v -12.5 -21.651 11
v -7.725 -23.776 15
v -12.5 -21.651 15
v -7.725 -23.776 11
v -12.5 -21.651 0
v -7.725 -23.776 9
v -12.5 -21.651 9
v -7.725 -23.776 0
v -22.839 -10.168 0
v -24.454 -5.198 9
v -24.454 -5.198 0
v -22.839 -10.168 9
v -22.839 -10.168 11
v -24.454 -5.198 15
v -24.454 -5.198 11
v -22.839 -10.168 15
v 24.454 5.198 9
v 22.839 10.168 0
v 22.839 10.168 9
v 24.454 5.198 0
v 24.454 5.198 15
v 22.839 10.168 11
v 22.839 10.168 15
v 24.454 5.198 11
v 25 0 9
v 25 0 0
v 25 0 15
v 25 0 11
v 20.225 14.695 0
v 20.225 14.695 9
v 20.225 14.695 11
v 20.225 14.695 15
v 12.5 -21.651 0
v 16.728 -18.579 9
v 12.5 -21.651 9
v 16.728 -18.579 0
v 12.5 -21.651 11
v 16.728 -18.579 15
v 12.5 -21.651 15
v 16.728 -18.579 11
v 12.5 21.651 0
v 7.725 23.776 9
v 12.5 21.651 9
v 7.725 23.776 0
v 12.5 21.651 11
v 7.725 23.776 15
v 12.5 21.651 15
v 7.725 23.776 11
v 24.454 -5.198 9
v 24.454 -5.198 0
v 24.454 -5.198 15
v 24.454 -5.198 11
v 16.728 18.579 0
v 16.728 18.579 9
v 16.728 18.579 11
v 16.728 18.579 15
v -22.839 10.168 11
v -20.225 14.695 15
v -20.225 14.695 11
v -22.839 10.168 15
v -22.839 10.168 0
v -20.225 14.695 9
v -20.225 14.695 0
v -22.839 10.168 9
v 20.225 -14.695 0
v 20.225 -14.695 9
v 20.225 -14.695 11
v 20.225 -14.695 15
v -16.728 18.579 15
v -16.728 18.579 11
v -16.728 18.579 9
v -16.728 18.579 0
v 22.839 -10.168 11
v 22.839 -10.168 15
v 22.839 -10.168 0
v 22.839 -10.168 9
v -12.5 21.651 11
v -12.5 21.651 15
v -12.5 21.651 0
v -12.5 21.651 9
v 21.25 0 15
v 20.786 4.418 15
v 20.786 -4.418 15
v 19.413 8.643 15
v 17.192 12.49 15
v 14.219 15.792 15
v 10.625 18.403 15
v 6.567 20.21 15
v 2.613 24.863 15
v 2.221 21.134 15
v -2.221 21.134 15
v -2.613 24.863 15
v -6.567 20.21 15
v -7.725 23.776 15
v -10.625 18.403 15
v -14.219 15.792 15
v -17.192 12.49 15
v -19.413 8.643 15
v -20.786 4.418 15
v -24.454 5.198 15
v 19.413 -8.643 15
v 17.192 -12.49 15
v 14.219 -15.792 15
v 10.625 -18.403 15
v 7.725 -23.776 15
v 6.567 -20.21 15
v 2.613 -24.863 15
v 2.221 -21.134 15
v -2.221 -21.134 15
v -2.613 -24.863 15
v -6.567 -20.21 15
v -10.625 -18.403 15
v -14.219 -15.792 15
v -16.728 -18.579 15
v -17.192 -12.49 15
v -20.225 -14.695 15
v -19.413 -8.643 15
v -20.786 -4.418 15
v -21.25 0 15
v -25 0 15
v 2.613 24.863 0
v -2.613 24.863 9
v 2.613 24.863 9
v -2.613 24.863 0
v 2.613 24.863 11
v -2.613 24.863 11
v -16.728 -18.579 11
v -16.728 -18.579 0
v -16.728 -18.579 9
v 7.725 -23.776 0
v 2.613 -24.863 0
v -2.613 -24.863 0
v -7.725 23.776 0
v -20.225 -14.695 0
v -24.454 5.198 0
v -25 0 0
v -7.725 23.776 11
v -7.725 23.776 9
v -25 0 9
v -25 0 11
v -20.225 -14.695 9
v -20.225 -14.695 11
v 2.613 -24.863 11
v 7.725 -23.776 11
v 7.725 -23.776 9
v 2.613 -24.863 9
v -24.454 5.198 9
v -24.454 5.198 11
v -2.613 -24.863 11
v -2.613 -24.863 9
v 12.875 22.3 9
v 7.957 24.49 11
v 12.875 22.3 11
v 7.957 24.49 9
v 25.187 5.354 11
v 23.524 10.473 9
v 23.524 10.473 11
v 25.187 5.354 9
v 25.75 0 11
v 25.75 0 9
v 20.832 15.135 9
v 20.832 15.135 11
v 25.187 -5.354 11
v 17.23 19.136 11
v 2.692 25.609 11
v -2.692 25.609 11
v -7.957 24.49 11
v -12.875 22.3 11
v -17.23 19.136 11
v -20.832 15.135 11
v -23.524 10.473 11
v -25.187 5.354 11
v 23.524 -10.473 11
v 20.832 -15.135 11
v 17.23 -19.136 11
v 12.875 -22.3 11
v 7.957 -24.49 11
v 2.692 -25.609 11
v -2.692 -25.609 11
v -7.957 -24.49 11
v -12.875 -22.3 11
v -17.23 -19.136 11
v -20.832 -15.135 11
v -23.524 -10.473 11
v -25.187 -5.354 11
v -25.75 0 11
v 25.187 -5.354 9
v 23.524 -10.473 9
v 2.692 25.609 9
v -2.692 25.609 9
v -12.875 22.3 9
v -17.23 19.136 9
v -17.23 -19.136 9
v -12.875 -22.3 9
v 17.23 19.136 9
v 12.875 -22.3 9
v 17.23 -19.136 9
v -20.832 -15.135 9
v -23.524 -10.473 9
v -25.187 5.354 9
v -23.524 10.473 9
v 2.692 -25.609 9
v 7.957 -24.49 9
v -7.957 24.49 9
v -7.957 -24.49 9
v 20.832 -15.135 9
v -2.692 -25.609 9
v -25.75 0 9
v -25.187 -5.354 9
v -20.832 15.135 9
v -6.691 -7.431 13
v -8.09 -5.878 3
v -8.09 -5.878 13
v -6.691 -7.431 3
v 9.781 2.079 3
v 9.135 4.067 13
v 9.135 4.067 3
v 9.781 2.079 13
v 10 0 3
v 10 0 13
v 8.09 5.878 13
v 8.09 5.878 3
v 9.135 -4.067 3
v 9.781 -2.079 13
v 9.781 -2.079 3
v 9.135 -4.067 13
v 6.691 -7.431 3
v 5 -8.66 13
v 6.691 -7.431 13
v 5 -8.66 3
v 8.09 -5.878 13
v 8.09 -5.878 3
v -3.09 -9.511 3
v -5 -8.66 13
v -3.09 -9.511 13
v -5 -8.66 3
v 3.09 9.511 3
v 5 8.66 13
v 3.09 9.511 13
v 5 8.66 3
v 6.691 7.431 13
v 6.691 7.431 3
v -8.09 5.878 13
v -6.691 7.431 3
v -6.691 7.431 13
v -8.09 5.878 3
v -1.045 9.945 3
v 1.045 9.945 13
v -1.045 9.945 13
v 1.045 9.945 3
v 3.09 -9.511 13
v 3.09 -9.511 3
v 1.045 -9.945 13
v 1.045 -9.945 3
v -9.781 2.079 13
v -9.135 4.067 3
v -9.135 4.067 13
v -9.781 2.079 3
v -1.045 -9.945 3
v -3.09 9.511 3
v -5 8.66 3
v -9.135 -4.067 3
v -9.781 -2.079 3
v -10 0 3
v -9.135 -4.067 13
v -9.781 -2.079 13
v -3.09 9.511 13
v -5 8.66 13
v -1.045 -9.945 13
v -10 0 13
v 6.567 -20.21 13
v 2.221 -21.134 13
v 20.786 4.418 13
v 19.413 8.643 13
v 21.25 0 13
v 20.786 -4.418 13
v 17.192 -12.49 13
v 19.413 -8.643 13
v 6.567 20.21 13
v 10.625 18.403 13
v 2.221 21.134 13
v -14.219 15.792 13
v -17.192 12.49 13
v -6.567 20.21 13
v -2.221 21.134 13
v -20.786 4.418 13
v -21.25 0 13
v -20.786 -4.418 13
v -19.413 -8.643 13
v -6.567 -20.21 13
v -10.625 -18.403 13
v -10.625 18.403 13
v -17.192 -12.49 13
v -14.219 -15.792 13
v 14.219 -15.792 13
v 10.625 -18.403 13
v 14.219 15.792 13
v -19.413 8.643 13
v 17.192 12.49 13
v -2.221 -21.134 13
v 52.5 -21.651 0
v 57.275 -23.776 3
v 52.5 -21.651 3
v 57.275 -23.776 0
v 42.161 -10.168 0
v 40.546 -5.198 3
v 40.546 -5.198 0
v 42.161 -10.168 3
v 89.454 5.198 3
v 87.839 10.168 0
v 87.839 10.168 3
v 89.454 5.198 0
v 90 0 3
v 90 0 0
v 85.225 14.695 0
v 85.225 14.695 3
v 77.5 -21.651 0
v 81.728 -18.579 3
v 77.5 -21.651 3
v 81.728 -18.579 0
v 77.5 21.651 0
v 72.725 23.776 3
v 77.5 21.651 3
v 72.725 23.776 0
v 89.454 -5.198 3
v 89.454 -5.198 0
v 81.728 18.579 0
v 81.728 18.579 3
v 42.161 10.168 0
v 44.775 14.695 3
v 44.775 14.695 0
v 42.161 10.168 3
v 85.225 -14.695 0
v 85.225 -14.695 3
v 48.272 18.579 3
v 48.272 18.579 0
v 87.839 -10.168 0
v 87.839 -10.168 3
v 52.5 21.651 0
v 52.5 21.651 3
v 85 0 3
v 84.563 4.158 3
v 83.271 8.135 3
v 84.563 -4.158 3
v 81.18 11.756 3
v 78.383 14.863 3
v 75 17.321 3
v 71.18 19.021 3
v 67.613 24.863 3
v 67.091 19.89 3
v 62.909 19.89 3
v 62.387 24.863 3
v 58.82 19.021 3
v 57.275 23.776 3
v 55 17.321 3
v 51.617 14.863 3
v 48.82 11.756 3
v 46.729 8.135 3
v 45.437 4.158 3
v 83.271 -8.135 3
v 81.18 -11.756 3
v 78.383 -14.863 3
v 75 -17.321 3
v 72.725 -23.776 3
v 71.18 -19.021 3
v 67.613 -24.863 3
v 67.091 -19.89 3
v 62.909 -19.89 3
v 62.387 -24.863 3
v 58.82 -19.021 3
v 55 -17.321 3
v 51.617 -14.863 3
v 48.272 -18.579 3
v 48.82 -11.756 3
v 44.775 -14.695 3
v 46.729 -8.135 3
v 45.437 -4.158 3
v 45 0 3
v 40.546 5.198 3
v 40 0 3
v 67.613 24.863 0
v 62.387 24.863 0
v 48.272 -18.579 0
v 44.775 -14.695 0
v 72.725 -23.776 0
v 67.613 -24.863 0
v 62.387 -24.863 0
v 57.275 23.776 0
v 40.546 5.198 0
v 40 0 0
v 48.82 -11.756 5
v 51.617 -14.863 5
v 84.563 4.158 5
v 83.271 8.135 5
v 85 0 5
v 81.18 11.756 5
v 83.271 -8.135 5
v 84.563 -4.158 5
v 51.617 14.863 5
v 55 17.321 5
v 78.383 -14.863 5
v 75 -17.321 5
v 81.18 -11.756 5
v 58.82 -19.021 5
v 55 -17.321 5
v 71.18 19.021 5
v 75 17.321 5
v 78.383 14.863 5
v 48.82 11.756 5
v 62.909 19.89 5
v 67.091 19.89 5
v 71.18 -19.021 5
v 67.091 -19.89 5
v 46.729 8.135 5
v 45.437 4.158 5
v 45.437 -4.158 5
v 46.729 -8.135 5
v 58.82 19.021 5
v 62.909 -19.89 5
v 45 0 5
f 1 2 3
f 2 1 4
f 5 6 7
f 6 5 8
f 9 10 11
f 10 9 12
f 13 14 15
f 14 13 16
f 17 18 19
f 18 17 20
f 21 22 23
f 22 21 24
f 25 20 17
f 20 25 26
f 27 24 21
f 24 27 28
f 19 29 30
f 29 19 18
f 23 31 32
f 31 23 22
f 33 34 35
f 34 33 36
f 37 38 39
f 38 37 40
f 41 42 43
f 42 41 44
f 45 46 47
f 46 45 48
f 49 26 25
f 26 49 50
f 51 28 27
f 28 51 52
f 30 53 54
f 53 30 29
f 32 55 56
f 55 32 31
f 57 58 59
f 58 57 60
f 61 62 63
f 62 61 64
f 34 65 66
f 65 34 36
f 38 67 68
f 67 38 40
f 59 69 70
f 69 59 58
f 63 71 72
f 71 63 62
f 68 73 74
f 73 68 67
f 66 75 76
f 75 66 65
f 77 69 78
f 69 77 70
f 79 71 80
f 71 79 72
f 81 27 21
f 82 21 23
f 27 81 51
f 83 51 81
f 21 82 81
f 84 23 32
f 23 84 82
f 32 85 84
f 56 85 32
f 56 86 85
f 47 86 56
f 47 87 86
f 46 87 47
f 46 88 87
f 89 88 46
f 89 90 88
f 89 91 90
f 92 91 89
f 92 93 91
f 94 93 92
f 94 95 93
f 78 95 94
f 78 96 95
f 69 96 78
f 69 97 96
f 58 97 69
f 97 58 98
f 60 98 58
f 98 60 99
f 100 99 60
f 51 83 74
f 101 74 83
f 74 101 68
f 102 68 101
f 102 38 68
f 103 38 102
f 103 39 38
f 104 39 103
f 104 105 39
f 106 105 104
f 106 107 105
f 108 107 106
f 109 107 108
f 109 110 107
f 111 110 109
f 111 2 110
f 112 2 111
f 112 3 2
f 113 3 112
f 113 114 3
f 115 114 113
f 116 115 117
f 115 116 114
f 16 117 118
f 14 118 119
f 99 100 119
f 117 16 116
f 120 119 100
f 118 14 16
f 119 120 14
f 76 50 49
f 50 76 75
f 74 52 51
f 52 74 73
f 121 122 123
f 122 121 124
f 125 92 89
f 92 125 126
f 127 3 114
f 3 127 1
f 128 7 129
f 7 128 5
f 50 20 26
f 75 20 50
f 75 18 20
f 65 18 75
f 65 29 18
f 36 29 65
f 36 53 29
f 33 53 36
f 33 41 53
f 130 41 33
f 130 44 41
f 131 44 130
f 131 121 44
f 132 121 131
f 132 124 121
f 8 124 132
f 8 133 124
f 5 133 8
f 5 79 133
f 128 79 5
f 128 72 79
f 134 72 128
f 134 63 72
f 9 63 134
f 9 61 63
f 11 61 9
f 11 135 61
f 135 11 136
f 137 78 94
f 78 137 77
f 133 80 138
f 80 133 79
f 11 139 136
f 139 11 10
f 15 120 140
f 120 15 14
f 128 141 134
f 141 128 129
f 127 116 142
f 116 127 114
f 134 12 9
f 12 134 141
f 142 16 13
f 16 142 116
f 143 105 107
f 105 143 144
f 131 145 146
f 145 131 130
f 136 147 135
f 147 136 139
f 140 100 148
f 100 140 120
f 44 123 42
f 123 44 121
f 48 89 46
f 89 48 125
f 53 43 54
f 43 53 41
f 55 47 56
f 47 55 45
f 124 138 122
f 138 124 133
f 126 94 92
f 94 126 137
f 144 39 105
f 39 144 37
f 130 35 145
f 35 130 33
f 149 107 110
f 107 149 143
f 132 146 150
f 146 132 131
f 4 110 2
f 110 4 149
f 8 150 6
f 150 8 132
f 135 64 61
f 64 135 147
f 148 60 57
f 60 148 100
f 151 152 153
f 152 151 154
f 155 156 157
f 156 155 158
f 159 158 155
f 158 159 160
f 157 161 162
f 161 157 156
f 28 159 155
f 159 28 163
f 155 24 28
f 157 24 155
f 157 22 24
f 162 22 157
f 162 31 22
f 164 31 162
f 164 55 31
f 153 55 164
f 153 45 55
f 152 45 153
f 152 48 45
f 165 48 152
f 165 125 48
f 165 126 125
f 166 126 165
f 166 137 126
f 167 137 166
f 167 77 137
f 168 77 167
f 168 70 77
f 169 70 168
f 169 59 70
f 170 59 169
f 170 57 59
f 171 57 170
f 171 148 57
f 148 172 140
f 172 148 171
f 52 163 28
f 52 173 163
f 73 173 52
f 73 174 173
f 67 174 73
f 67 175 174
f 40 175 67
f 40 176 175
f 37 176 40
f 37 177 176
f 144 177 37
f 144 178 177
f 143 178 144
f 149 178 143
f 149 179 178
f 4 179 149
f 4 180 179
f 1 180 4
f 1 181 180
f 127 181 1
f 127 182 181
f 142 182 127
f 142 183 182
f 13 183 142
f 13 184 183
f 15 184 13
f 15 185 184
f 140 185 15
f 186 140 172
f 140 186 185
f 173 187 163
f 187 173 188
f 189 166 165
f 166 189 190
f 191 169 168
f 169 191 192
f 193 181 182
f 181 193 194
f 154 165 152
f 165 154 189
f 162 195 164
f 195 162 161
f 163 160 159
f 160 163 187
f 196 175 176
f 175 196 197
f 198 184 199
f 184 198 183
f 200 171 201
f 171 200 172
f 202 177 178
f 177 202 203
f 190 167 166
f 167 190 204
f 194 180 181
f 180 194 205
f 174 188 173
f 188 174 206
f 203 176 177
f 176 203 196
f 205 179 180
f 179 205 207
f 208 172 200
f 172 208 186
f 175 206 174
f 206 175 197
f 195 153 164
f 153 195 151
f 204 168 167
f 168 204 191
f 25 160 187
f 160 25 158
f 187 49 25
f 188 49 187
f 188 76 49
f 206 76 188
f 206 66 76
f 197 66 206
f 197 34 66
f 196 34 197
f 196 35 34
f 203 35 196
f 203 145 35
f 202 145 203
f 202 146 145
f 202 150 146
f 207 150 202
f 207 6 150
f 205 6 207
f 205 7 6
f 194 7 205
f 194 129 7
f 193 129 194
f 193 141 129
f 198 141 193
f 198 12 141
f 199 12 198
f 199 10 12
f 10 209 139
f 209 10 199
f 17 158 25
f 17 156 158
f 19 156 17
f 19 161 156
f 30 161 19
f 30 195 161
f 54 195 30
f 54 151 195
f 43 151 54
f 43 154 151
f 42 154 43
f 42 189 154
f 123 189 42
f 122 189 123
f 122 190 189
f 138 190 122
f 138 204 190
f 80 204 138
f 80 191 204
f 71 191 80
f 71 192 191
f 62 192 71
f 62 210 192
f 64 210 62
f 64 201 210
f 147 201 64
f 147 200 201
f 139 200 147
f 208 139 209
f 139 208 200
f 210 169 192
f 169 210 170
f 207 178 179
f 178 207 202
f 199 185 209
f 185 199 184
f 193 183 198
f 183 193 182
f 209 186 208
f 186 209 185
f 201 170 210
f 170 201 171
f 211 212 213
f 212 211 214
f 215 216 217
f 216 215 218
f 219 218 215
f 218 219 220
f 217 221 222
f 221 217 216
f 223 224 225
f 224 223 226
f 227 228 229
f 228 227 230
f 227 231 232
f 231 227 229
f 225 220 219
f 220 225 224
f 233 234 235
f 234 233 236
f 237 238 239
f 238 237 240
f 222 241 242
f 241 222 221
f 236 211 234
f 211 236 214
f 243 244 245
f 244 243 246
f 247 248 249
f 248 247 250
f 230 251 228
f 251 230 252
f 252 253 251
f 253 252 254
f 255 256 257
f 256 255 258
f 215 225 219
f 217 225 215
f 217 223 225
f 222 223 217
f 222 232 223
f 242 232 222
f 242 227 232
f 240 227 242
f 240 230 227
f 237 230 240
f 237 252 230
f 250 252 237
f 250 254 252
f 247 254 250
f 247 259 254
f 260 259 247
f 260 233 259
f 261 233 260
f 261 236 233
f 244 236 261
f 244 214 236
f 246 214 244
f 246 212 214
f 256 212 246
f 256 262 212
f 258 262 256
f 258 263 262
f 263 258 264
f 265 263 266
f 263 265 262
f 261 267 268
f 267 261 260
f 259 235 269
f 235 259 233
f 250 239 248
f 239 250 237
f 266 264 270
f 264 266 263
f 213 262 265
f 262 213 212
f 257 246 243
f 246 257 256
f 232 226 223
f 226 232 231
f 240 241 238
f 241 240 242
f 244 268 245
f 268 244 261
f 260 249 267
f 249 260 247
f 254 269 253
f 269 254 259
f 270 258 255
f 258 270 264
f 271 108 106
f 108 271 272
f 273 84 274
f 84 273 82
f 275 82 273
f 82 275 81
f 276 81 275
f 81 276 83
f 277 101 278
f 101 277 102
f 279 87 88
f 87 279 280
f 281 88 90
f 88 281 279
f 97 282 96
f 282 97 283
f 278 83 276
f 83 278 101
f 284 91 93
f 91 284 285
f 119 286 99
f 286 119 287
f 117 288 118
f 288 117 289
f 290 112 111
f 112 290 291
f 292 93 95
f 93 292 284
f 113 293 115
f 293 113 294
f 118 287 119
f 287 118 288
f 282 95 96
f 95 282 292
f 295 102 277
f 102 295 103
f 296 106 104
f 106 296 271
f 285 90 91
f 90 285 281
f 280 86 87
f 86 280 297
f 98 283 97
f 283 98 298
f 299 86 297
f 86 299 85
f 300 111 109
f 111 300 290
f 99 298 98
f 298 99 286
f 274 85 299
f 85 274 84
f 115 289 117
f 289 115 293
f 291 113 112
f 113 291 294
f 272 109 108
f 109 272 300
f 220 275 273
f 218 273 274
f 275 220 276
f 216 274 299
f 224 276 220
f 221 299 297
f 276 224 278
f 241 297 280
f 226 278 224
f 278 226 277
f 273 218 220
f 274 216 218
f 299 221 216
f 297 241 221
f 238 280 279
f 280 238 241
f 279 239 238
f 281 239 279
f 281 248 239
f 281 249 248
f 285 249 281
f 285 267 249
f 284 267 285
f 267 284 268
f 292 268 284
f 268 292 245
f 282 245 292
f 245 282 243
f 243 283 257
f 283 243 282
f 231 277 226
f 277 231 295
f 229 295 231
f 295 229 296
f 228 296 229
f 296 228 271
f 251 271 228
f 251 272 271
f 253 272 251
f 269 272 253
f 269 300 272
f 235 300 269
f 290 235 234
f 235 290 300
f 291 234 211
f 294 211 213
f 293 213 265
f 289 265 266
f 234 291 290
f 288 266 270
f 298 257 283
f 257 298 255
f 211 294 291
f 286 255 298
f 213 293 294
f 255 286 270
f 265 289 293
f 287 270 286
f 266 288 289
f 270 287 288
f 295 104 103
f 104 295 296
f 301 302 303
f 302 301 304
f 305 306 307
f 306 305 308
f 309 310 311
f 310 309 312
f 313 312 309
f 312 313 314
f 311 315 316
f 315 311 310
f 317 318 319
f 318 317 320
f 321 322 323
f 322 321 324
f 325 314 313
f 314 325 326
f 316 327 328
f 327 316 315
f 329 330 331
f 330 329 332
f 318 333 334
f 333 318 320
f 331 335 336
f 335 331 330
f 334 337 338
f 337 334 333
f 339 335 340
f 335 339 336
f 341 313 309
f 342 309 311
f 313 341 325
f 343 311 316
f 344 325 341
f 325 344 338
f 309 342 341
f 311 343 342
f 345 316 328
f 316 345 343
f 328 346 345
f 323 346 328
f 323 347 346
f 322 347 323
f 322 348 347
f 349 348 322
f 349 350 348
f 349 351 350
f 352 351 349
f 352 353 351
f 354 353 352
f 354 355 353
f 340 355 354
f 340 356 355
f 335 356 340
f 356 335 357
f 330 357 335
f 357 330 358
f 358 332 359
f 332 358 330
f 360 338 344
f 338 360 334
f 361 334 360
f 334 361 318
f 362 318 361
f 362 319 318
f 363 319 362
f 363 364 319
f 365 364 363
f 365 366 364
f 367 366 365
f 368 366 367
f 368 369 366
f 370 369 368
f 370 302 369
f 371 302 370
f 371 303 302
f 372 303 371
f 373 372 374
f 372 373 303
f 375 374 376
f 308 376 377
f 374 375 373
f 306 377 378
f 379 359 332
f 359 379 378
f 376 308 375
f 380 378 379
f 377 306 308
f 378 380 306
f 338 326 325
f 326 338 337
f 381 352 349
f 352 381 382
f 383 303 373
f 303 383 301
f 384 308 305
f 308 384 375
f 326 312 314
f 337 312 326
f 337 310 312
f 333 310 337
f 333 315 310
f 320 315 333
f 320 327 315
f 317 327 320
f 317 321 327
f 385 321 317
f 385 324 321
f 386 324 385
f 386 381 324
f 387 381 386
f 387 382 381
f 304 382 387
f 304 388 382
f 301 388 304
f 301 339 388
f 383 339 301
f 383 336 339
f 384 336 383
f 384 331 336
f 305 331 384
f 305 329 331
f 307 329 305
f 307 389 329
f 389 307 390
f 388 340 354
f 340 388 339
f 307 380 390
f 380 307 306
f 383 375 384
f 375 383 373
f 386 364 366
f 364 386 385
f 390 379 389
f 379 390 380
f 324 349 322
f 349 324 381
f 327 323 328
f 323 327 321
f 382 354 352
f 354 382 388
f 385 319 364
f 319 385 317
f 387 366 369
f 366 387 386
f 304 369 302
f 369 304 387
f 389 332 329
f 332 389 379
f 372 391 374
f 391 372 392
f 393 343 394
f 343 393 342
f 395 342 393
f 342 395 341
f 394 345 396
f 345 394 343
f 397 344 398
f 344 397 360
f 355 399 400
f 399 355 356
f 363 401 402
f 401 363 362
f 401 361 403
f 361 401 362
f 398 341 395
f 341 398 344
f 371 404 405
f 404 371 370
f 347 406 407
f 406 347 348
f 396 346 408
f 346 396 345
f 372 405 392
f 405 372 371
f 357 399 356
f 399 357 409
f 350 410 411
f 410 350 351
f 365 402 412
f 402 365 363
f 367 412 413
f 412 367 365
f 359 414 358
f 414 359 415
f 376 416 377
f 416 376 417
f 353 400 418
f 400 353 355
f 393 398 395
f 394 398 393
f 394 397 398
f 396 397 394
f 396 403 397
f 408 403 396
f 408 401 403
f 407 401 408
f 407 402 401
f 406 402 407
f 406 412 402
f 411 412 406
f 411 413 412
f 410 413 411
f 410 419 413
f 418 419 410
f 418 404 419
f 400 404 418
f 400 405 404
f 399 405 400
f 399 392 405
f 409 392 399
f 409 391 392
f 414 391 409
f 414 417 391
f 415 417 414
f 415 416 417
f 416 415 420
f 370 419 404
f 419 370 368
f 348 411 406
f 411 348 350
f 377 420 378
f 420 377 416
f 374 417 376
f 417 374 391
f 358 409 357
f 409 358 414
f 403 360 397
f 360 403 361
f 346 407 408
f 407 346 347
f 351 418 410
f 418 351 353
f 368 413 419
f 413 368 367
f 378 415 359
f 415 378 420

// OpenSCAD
height= 15;
width= 25;
innerw= 10;

difference(){ outer(); #inner();}

module outer() {

cylinder (height,width,width);

translate([0,0,3/5*height])
cylinder(2,width+.75,width+.75);}



translate([width+40,0,0,]) lid();


module inner() {

translate([0,0,3])cylinder(height-3,innerw,innerw);

translate([0,0,height-2])cylinder(2,.85*width,.85*width);}


module lid() {
cylinder(3,width,width);

cylinder(5,.8*width, .8*width);
}
